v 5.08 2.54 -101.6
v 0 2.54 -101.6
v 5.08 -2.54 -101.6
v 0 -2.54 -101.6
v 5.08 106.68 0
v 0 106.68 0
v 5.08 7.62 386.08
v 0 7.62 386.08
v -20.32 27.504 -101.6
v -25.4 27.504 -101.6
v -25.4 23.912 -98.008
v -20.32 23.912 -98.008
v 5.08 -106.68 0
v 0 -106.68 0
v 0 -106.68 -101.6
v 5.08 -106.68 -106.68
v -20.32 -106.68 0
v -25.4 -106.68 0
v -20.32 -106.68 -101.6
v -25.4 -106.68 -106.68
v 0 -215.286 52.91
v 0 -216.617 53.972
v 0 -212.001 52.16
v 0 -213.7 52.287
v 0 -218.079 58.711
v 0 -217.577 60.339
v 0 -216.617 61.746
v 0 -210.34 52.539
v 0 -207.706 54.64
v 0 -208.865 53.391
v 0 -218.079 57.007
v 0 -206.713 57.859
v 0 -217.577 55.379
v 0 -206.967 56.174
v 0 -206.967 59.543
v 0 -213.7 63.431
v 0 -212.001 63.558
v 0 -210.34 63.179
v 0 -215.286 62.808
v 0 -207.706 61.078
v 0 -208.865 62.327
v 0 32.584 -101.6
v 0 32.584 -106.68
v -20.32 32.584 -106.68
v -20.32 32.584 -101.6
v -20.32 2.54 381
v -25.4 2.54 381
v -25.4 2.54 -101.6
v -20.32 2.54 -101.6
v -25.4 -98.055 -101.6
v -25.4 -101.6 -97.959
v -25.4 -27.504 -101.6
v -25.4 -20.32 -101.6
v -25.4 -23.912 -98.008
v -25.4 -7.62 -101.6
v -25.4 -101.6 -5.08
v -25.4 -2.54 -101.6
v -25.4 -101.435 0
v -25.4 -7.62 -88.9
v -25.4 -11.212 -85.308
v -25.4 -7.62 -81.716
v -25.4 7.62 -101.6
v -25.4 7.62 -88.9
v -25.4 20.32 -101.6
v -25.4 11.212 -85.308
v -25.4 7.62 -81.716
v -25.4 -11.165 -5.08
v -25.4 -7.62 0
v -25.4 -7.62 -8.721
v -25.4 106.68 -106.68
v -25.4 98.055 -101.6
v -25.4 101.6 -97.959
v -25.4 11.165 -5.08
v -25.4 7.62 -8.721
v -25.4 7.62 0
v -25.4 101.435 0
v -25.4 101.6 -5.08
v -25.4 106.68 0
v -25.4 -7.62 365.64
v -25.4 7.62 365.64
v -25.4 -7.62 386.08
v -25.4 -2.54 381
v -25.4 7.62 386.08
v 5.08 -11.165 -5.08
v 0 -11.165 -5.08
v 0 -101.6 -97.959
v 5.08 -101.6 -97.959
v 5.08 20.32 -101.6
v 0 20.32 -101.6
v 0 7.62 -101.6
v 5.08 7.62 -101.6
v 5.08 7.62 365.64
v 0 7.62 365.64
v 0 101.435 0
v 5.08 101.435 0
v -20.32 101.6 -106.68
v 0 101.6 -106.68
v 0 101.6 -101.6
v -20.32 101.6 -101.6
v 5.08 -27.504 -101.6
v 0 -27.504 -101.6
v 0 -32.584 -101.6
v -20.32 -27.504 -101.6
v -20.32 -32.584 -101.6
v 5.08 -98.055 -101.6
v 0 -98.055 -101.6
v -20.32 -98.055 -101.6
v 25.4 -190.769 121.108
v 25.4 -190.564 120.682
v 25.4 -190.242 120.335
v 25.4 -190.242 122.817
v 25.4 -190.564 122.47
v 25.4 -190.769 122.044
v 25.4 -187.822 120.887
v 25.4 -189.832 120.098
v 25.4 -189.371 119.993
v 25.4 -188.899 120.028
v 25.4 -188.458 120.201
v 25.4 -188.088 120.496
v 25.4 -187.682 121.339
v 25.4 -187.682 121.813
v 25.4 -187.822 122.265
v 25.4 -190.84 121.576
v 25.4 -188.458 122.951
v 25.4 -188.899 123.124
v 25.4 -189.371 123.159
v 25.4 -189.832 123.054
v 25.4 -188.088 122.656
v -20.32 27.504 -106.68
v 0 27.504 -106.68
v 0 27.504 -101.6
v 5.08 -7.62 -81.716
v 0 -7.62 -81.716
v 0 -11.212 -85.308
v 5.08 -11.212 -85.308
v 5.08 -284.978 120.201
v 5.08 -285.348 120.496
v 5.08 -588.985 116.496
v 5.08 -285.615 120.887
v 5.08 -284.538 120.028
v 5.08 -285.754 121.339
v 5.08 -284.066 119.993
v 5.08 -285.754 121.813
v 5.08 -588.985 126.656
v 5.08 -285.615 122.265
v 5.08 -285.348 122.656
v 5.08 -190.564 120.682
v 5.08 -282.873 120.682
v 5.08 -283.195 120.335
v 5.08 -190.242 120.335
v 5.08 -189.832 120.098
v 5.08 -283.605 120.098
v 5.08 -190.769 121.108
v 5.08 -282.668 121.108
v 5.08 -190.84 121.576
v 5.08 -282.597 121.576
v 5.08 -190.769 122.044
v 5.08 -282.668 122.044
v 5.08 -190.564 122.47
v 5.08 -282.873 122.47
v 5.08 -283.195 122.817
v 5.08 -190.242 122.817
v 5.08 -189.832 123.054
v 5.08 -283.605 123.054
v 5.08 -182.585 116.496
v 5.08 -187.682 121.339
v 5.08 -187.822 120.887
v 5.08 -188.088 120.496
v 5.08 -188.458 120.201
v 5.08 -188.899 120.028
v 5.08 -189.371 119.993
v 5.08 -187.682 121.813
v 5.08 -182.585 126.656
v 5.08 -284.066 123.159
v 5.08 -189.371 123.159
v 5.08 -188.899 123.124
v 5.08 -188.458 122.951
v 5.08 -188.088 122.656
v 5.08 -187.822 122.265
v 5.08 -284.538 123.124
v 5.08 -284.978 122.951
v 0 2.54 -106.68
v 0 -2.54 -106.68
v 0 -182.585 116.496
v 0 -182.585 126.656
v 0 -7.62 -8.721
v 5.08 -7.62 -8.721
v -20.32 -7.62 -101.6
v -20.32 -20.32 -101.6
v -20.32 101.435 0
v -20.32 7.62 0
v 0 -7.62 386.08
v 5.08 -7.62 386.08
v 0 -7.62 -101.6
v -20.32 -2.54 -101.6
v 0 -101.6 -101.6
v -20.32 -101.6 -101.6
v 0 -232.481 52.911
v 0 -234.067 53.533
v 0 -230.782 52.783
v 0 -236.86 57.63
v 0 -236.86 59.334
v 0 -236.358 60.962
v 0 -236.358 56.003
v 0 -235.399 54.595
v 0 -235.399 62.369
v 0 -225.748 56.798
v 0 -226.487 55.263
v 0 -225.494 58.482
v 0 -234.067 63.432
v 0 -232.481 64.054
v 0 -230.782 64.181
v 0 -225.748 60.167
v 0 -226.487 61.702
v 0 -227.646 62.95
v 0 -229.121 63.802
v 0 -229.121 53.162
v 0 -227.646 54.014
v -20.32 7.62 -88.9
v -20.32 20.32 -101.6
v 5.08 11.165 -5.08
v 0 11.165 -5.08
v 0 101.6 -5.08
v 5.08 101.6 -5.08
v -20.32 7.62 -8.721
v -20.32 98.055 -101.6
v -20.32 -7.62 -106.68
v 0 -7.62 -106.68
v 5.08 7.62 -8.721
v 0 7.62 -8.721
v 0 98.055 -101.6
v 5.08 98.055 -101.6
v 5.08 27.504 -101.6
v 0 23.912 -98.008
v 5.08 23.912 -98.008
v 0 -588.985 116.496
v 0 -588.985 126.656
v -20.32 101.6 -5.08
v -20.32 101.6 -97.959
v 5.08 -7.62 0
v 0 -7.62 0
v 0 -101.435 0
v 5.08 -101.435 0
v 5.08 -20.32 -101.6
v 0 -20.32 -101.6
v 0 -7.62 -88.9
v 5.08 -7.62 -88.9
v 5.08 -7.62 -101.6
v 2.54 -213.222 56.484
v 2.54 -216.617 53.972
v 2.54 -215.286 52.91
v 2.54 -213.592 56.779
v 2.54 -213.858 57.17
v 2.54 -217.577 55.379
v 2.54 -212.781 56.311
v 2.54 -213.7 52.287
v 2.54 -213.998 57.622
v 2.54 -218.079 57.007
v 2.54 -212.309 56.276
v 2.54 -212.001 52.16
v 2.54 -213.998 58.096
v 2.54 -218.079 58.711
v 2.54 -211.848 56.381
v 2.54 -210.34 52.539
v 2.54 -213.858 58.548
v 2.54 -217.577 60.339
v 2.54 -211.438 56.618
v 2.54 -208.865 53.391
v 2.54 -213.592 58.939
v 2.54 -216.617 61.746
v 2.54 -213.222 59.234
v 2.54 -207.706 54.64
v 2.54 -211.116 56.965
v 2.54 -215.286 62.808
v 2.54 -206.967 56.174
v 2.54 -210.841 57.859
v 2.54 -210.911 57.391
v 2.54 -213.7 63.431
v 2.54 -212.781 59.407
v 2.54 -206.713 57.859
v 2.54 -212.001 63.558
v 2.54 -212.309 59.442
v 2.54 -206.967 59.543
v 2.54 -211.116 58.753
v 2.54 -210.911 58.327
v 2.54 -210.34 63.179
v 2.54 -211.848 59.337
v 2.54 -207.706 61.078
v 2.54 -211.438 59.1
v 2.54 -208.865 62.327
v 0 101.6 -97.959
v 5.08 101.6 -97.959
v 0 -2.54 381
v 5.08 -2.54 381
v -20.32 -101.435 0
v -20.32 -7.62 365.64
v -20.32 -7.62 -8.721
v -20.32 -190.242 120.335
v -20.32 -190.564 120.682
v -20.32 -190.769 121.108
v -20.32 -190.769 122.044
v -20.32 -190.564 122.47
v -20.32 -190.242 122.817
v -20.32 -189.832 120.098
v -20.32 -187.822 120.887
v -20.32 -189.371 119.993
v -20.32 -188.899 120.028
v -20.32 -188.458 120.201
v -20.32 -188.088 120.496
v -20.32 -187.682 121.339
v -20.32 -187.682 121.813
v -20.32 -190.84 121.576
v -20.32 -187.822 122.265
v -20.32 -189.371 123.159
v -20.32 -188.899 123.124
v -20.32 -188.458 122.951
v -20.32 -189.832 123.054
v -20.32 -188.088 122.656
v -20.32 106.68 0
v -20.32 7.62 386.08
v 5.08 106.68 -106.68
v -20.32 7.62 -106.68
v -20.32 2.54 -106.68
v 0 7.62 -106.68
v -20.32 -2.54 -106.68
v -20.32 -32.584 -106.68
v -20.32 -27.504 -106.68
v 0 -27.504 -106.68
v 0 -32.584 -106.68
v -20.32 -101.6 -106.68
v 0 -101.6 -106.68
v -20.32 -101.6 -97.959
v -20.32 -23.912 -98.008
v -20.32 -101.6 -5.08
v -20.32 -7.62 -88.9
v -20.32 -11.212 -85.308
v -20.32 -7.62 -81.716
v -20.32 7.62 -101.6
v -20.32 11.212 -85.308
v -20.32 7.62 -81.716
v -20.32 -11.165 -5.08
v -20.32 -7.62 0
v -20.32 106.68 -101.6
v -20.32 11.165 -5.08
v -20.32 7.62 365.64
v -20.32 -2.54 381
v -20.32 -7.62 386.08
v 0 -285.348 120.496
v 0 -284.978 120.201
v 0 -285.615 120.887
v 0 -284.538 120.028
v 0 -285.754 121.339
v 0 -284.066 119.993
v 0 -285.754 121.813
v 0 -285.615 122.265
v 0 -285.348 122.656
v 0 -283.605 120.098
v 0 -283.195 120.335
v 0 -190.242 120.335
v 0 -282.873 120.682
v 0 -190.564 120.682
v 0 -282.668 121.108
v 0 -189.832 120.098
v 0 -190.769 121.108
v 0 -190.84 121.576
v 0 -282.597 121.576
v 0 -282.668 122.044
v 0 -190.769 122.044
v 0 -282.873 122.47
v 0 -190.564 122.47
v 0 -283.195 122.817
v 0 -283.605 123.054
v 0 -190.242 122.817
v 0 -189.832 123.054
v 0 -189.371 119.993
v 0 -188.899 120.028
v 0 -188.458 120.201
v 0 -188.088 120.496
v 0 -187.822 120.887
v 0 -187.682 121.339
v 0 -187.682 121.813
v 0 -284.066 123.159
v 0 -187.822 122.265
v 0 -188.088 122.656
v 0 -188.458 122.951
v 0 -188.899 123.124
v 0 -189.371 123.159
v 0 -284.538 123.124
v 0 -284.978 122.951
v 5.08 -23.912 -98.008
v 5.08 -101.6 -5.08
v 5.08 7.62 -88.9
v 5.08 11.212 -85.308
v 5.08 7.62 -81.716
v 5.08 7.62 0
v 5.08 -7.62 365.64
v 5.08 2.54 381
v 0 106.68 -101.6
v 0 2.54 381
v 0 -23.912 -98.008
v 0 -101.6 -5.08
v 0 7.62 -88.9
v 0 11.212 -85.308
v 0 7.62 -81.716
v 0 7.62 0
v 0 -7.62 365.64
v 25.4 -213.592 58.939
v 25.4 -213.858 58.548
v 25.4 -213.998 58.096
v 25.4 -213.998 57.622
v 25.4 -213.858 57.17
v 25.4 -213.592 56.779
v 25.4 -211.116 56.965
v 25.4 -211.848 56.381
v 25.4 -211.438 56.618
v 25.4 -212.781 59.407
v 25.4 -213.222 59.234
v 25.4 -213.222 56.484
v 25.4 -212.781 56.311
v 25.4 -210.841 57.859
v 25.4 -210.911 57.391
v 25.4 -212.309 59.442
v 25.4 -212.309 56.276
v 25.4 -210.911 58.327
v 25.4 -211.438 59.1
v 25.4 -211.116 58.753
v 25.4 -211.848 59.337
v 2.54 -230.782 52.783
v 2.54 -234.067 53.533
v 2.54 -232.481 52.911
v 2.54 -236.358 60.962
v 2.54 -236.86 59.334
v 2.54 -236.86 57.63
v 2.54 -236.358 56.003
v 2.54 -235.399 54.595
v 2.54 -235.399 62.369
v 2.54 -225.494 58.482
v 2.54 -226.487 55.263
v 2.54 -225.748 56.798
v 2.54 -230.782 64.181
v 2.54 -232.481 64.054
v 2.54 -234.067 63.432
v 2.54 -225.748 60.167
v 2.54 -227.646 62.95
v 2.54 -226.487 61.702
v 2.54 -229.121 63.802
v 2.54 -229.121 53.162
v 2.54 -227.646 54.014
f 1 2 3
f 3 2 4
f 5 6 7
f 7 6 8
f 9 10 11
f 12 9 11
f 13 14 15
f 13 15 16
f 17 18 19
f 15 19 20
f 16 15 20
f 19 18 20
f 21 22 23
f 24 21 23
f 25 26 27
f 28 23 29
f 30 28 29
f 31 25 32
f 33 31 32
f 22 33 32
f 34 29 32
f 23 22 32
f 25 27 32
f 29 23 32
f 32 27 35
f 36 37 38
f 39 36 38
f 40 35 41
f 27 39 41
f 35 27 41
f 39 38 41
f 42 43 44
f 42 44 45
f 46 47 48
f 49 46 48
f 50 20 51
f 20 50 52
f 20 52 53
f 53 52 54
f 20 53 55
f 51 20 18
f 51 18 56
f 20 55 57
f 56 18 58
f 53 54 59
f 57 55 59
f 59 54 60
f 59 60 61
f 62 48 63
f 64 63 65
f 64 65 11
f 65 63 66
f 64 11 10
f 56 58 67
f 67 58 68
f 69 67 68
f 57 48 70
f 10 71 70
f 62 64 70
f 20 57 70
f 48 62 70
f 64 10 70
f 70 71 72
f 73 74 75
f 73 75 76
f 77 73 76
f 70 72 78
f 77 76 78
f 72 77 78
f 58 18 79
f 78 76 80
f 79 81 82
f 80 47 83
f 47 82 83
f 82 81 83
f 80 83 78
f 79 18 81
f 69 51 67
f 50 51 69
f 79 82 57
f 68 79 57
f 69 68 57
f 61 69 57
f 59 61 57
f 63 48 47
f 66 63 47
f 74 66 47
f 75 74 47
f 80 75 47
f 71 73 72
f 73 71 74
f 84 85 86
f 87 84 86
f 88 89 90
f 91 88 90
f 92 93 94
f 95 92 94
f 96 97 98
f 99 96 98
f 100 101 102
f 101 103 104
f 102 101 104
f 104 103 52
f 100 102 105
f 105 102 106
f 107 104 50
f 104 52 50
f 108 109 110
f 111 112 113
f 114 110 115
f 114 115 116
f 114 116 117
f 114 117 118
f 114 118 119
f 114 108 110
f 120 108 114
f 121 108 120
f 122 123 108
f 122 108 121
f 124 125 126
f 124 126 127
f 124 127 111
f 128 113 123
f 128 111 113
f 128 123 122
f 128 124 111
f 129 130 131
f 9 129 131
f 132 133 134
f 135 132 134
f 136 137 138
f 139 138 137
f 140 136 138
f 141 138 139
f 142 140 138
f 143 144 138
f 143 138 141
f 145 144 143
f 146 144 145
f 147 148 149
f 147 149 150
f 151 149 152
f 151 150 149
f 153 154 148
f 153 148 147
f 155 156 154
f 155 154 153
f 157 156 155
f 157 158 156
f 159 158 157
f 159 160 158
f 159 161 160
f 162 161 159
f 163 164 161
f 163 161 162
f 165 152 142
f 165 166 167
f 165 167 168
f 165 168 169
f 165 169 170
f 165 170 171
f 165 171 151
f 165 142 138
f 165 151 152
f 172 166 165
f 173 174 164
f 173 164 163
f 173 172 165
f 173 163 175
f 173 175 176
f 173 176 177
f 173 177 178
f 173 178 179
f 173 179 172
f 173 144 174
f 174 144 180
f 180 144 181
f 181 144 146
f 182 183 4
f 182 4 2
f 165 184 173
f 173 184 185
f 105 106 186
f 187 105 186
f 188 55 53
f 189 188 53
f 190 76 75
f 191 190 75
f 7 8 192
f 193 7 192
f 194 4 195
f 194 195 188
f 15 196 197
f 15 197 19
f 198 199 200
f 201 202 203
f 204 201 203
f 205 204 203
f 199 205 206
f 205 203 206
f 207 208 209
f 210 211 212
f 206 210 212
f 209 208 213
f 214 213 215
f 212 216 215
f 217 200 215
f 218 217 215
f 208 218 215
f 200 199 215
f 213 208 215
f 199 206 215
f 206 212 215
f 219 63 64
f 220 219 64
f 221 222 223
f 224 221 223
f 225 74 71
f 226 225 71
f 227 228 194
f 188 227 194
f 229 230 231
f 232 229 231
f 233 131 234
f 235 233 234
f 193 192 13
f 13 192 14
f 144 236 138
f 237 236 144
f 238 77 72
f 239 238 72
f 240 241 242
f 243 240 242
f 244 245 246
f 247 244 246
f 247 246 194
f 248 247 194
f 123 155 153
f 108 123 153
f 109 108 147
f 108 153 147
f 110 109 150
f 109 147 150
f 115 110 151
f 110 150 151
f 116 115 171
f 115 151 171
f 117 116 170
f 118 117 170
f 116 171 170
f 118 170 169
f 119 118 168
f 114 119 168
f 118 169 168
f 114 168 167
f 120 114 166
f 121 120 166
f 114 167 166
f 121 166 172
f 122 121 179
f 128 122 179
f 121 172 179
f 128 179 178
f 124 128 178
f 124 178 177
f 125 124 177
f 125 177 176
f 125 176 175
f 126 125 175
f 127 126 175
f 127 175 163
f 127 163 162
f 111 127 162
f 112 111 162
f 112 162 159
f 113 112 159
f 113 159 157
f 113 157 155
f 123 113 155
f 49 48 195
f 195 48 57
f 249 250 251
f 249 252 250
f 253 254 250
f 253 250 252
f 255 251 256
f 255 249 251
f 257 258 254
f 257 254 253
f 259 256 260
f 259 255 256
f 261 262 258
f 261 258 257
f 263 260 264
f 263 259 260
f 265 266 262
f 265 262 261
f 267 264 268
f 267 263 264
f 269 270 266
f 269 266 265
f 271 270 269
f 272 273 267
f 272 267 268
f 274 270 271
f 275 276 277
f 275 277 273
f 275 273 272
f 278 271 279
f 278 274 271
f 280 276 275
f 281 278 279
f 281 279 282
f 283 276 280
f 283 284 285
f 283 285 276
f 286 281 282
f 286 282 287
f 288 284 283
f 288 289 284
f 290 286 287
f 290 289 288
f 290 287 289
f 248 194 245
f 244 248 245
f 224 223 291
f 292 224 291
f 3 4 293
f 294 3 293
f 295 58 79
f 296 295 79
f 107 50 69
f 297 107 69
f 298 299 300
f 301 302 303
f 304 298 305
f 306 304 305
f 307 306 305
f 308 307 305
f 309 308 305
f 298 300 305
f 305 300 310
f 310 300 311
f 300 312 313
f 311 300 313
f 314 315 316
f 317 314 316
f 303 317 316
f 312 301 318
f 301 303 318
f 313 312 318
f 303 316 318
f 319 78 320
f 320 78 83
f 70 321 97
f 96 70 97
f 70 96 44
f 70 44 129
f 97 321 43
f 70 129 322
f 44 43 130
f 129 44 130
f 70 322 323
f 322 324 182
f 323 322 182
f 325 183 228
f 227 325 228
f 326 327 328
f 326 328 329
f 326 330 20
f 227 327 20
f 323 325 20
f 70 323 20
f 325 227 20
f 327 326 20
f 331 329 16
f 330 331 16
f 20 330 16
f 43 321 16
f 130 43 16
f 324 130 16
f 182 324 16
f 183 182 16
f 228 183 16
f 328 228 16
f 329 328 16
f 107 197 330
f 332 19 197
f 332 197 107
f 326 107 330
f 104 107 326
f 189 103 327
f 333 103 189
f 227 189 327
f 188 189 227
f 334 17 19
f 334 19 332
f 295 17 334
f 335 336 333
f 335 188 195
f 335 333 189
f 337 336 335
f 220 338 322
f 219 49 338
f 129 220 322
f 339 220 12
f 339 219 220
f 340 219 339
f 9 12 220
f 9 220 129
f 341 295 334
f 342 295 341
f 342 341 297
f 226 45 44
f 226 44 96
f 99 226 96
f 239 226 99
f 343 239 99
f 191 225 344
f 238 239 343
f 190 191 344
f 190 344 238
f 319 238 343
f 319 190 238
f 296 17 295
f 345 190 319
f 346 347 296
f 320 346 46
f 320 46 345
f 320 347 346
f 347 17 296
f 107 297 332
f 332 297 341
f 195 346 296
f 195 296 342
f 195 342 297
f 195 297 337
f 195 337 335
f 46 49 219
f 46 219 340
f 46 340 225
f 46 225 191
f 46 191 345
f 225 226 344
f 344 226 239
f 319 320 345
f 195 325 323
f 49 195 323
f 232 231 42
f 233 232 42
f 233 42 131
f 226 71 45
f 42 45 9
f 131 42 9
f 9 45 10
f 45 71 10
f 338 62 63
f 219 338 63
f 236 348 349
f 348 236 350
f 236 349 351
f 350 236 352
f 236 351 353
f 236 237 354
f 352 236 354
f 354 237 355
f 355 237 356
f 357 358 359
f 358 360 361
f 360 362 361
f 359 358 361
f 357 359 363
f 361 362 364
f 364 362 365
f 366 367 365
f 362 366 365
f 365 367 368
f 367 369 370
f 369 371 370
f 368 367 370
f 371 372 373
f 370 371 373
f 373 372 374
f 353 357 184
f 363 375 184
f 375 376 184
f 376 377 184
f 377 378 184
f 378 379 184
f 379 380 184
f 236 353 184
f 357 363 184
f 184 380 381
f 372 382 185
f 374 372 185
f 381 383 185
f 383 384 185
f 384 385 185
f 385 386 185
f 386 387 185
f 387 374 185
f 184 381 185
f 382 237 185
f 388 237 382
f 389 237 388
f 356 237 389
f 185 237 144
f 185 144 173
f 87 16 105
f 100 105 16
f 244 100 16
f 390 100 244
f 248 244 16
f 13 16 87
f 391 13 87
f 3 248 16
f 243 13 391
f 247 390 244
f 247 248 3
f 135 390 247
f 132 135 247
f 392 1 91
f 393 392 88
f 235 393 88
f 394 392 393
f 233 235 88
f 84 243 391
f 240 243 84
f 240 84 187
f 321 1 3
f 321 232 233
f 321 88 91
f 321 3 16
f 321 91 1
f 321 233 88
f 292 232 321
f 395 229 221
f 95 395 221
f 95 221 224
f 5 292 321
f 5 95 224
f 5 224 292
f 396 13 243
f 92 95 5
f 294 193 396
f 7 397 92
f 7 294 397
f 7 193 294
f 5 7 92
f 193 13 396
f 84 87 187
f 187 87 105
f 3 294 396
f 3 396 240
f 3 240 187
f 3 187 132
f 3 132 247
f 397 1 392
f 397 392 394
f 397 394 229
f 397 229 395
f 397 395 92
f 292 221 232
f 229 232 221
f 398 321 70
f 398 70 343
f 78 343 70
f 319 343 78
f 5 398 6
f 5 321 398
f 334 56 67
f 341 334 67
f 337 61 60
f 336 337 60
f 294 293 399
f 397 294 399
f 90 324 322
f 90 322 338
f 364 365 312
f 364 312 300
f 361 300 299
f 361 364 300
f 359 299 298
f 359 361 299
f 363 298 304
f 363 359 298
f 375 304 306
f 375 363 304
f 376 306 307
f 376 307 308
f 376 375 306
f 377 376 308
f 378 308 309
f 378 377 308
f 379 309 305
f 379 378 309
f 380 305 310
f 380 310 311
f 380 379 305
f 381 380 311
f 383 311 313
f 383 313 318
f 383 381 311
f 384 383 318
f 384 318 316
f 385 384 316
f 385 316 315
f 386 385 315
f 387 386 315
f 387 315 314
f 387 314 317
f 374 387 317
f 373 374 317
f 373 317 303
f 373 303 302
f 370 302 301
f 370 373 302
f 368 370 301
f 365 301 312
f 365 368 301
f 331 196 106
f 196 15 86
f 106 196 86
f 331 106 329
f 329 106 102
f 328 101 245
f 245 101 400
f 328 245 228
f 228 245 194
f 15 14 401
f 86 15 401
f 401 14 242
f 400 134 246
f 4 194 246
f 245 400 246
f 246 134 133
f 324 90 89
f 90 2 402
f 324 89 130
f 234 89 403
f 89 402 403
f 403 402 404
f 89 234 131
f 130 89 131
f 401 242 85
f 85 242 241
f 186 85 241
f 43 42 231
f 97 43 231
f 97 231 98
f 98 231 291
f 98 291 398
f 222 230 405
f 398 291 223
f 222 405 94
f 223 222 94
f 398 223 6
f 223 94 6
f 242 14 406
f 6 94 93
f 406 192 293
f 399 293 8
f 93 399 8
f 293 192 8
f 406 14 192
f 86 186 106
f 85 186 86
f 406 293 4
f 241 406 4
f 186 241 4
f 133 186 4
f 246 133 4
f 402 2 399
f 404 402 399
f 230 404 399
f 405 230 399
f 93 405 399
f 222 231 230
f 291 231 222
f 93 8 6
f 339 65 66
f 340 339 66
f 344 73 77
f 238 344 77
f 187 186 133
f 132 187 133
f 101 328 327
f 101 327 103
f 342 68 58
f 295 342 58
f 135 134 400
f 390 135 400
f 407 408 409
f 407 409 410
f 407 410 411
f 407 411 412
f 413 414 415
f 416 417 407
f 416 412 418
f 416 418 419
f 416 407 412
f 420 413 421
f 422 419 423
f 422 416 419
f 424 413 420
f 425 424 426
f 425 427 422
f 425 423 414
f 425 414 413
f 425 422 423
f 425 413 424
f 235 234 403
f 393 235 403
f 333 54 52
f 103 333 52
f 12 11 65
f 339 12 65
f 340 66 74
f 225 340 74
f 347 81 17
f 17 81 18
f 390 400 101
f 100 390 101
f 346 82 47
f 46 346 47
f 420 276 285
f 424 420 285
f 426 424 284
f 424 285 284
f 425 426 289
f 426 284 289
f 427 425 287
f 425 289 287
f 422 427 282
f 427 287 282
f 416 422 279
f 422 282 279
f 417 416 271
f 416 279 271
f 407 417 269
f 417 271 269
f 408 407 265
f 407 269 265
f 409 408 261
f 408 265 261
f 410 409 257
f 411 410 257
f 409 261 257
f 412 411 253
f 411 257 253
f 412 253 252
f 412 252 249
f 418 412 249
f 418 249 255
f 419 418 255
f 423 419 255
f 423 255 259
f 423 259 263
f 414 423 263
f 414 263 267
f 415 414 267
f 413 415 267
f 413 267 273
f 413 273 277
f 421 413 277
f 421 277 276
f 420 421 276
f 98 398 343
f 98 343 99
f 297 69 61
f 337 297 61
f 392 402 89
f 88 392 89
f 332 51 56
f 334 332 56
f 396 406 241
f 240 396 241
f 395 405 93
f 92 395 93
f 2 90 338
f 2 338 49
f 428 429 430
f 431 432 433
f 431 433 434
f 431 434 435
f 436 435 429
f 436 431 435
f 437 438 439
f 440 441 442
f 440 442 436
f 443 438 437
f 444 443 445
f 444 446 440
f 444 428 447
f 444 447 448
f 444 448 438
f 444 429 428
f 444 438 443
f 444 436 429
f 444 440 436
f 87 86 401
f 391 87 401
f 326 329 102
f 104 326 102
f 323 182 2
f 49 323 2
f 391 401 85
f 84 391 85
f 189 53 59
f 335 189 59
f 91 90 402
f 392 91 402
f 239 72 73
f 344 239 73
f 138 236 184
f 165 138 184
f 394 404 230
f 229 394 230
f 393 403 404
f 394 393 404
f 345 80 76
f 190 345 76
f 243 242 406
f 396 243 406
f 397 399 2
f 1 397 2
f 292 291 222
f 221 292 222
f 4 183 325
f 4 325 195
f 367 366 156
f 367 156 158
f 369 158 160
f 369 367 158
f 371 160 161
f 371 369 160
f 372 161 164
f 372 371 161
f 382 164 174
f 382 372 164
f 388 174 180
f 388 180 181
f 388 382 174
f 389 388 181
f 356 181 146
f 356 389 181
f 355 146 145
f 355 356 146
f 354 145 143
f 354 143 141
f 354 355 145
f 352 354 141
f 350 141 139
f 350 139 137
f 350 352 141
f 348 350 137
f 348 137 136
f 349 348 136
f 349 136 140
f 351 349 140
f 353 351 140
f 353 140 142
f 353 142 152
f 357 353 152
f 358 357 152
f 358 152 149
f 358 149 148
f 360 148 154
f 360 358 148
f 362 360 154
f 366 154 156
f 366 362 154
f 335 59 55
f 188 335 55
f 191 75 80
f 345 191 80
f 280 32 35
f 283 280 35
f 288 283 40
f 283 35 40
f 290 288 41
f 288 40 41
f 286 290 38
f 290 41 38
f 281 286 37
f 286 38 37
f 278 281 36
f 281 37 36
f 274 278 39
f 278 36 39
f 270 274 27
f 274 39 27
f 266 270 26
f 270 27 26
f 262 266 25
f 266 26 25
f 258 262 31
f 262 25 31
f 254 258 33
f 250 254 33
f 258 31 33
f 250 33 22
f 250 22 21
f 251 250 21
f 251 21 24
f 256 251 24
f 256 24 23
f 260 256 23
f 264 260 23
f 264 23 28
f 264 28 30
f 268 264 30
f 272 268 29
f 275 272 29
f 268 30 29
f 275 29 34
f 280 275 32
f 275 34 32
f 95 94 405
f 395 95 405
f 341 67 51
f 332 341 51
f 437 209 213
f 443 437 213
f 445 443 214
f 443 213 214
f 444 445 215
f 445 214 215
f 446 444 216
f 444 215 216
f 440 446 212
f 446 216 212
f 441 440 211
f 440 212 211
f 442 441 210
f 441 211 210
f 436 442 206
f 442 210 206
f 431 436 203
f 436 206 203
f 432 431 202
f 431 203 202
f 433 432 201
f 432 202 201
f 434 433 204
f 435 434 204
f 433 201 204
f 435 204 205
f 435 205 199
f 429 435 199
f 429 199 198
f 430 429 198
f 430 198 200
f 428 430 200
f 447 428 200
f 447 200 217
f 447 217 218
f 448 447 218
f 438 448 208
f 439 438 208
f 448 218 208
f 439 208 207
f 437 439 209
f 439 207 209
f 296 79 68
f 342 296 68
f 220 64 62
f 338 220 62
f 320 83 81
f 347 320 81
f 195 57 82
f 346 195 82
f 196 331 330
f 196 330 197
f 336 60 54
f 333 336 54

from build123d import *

# Parameters (mm, degrees)
F0_W      = 5.08
F0_H      = 5.08
F1_DEPTH  = 5.08
F4_W      = 5.08
F4_H      = 5.08
F5_DEPTH  = 20.32
F6_W      = 406.4
F6_H      = 10.16
F6_R      = 1.5875
F7_DEPTH  = 5.08
F8_R      = 5.715
F8_R_2    = 1.5875
F9_DEPTH  = 2.54
F10_DEPTH = 25.4
F11_R     = 5.715
F12_DEPTH = 2.54
F15_DEPTH = 25.4
F16_DEPTH = 20.32


# Not quite as in the source:
# - the program builds the solid bodies; features that only make, move or delete a surface that nothing else refers to are left out


with BuildPart() as f1:
    # F0 (on Right) → F1 (new body)
    with BuildSketch(Plane.YZ):
        Polygon((2.54, -101.6), (0, -101.6), (-2.54, -101.6), (-7.62, -101.6), (-20.32, -101.6), (-27.5042048969, -101.6), (-98.0548469748, -101.6), (-101.6, -101.6), (-101.6, -97.9590320281), (-101.6, -5.08), (-101.6, 0), (-106.68, 0), (-106.68, -106.68), (0, -106.68), (106.68, -106.68), (106.68, 0), (101.6, 0), (101.6, -5.08), (101.6, -97.9590320281), (101.6, -101.6), (98.0548469748, -101.6), (27.5042048969, -101.6), (20.32, -101.6), (7.62, -101.6), align=None)
        Polygon((101.4354498343, 0), (7.62, 0), (7.62, -5.08), (11.1651530252, -5.08), (101.6, -5.08), (101.6, 0), align=None)
        Polygon((-7.62, -5.08), (-7.62, 0), (-101.4354498343, 0), (-101.6, 0), (-101.6, -5.08), (-11.1651530252, -5.08), align=None)
        Polygon((2.54, 381), (2.54, 0), (7.62, 0), (7.62, 365.6397019183), (7.62, 381), align=None)
        Polygon((-7.62, 0), (-2.54, 0), (-2.54, 381), (-7.62, 381), (-7.62, 365.6397019183), align=None)
        Polygon((-2.54, 381), (2.54, 381), (7.62, 381), (7.62, 386.08), (-7.62, 386.08), (-7.62, 381), align=None)
        Polygon((-2.54, -101.6), (-2.54, -5.08), (-7.62, -5.08), (-7.62, -8.7209679719), (-7.62, -81.7157951031), (-7.62, -88.9), (-7.62, -101.6), align=None)
        Polygon((-7.62, -8.7209679719), (-7.62, -5.08), (-11.1651530252, -5.08), (-101.6, -97.9590320281), (-101.6, -101.6), (-98.0548469748, -101.6), align=None)
        with Locations((5.08, -2.54)):
            Rectangle(F0_W, F0_H)
        with Locations((-5.08, -2.54)):
            Rectangle(F0_W, F0_H)
        Polygon((7.62, -5.08), (2.54, -5.08), (2.54, -101.6), (7.62, -101.6), (7.62, -88.9), (7.62, -81.7157951031), (7.62, -8.7209679719), align=None)
        Polygon((11.1651530252, -5.08), (7.62, -5.08), (7.62, -8.7209679719), (98.0548469748, -101.6), (101.6, -101.6), (101.6, -97.9590320281), align=None)
        Polygon((11.2121024484, -85.3078975516), (7.62, -81.7157951031), (7.62, -88.9), (20.32, -101.6), (27.5042048969, -101.6), (23.9121024484, -98.0078975516), align=None)
        Polygon((-27.5042048969, -101.6), (-20.32, -101.6), (-7.62, -88.9), (-7.62, -81.7157951031), (-11.2121024484, -85.3078975516), (-23.9121024484, -98.0078975516), align=None)
        Polygon((7.62, 365.6397019183), (101.4354498343, 0), (101.6, 0), (106.68, 0), (7.62, 386.08), (7.62, 381), align=None)
        Polygon((-101.6, 0), (-101.4354498343, 0), (-7.62, 365.6397019183), (-7.62, 381), (-7.62, 386.08), (-106.68, 0), align=None)
    extrude(amount=F1_DEPTH)


with BuildPart() as f2_1:
    # F2: copy of F1
    add(f1.part)


with BuildPart() as f2_1_1:
    # F3: moved
    add(f2_1.part.moved(Location((-25.4, 0, 0))))


with BuildPart() as f1_1:
    add(f1.part)

    add(f2_1_1.part)  # F5 merges F2_1
    # F4 (on face) → F5 (join, through all)
    with BuildSketch(Plane(origin=(0, 0, 0), x_dir=(0, -1, 0), z_dir=(-1, 0, 0))):
        with Locations((-104.14, -104.14)):
            Rectangle(F4_W, F4_H)
        with Locations((-30.0442048969, -104.14)):
            Rectangle(F4_W, F4_H)
        with Locations((-5.08, -104.14)):
            Rectangle(F4_W, F4_H)
        with Locations((5.08, -104.14)):
            Rectangle(F4_W, F4_H)
        with Locations((30.0442048969, -104.14)):
            Rectangle(F4_W, F4_H)
        with Locations((104.14, -104.14)):
            Rectangle(F4_W, F4_H)
    extrude(amount=F5_DEPTH)


with BuildPart() as f7:
    # F6 (on Right) → F7 (new body)
    with BuildSketch(Plane.YZ):
        with Locations((-385.7845490456, 121.5760712194)):
            Rectangle(F6_W, F6_H)
        with Locations((-284.1845490456, 121.5760712194)):
            Circle(F6_R, mode=Mode.SUBTRACT)
        with BuildLine():
            ThreePointArc((-190.8395490456, 121.5760712194), (-189.2520490456, 123.1635712194), (-187.6645490456, 121.5760712194))
            ThreePointArc((-187.6645490456, 121.5760712194), (-189.2520490456, 119.9885712194), (-190.8395490456, 121.5760712194))
        make_face(mode=Mode.SUBTRACT)
        with BuildLine():
            ThreePointArc((-190.8395490456, 121.5760712194), (-189.2520490456, 119.9885712194), (-187.6645490456, 121.5760712194))
            Line((-187.6645490456, 121.5760712194), (-190.8395490456, 121.5760712194))
        make_face()
        with BuildLine():
            Line((-190.8395490456, 121.5760712194), (-187.6645490456, 121.5760712194))
            ThreePointArc((-187.6645490456, 121.5760712194), (-189.2520490456, 123.1635712194), (-190.8395490456, 121.5760712194))
        make_face()
    extrude(amount=F7_DEPTH)

    # F6 (on Right) → F15 (join)
    with BuildSketch(Plane.YZ):
        with BuildLine():
            Line((-190.8395490456, 121.5760712194), (-187.6645490456, 121.5760712194))
            ThreePointArc((-187.6645490456, 121.5760712194), (-189.2520490456, 123.1635712194), (-190.8395490456, 121.5760712194))
        make_face()
        with BuildLine():
            ThreePointArc((-190.8395490456, 121.5760712194), (-189.2520490456, 119.9885712194), (-187.6645490456, 121.5760712194))
            Line((-187.6645490456, 121.5760712194), (-190.8395490456, 121.5760712194))
        make_face()
    extrude(amount=F15_DEPTH)

    # F6 (on Right) → F16 (join)
    with BuildSketch(Plane.YZ):
        with BuildLine():
            Line((-190.8395490456, 121.5760712194), (-187.6645490456, 121.5760712194))
            ThreePointArc((-187.6645490456, 121.5760712194), (-189.2520490456, 123.1635712194), (-190.8395490456, 121.5760712194))
        make_face()
        with BuildLine():
            ThreePointArc((-190.8395490456, 121.5760712194), (-189.2520490456, 119.9885712194), (-187.6645490456, 121.5760712194))
            Line((-187.6645490456, 121.5760712194), (-190.8395490456, 121.5760712194))
        make_face()
    extrude(amount=-F16_DEPTH)


with BuildPart() as f9:
    # F8 (on Right) → F9 (new body)
    with BuildSketch(Plane.YZ):
        with Locations((-212.4280929565, 57.8589513898)):
            Circle(F8_R)
        with Locations((-212.4280929565, 57.8589513898)):
            Circle(F8_R_2, mode=Mode.SUBTRACT)
        with Locations((-212.4280929565, 57.8589513898)):
            Circle(F8_R_2)
    extrude(amount=F9_DEPTH)

    # F8 (on Right) → F10 (join)
    with BuildSketch(Plane.YZ):
        with Locations((-212.4280929565, 57.8589513898)):
            Circle(F8_R_2)
    extrude(amount=F10_DEPTH)


with BuildPart() as f12:
    # F11 (on Right) → F12 (new body)
    with BuildSketch(Plane.YZ):
        with Locations((-231.2091737986, 58.4822148085)):
            Circle(F11_R)
    extrude(amount=F12_DEPTH)


solid = Compound([f1_1.part, f7.part, f9.part, f12.part])
